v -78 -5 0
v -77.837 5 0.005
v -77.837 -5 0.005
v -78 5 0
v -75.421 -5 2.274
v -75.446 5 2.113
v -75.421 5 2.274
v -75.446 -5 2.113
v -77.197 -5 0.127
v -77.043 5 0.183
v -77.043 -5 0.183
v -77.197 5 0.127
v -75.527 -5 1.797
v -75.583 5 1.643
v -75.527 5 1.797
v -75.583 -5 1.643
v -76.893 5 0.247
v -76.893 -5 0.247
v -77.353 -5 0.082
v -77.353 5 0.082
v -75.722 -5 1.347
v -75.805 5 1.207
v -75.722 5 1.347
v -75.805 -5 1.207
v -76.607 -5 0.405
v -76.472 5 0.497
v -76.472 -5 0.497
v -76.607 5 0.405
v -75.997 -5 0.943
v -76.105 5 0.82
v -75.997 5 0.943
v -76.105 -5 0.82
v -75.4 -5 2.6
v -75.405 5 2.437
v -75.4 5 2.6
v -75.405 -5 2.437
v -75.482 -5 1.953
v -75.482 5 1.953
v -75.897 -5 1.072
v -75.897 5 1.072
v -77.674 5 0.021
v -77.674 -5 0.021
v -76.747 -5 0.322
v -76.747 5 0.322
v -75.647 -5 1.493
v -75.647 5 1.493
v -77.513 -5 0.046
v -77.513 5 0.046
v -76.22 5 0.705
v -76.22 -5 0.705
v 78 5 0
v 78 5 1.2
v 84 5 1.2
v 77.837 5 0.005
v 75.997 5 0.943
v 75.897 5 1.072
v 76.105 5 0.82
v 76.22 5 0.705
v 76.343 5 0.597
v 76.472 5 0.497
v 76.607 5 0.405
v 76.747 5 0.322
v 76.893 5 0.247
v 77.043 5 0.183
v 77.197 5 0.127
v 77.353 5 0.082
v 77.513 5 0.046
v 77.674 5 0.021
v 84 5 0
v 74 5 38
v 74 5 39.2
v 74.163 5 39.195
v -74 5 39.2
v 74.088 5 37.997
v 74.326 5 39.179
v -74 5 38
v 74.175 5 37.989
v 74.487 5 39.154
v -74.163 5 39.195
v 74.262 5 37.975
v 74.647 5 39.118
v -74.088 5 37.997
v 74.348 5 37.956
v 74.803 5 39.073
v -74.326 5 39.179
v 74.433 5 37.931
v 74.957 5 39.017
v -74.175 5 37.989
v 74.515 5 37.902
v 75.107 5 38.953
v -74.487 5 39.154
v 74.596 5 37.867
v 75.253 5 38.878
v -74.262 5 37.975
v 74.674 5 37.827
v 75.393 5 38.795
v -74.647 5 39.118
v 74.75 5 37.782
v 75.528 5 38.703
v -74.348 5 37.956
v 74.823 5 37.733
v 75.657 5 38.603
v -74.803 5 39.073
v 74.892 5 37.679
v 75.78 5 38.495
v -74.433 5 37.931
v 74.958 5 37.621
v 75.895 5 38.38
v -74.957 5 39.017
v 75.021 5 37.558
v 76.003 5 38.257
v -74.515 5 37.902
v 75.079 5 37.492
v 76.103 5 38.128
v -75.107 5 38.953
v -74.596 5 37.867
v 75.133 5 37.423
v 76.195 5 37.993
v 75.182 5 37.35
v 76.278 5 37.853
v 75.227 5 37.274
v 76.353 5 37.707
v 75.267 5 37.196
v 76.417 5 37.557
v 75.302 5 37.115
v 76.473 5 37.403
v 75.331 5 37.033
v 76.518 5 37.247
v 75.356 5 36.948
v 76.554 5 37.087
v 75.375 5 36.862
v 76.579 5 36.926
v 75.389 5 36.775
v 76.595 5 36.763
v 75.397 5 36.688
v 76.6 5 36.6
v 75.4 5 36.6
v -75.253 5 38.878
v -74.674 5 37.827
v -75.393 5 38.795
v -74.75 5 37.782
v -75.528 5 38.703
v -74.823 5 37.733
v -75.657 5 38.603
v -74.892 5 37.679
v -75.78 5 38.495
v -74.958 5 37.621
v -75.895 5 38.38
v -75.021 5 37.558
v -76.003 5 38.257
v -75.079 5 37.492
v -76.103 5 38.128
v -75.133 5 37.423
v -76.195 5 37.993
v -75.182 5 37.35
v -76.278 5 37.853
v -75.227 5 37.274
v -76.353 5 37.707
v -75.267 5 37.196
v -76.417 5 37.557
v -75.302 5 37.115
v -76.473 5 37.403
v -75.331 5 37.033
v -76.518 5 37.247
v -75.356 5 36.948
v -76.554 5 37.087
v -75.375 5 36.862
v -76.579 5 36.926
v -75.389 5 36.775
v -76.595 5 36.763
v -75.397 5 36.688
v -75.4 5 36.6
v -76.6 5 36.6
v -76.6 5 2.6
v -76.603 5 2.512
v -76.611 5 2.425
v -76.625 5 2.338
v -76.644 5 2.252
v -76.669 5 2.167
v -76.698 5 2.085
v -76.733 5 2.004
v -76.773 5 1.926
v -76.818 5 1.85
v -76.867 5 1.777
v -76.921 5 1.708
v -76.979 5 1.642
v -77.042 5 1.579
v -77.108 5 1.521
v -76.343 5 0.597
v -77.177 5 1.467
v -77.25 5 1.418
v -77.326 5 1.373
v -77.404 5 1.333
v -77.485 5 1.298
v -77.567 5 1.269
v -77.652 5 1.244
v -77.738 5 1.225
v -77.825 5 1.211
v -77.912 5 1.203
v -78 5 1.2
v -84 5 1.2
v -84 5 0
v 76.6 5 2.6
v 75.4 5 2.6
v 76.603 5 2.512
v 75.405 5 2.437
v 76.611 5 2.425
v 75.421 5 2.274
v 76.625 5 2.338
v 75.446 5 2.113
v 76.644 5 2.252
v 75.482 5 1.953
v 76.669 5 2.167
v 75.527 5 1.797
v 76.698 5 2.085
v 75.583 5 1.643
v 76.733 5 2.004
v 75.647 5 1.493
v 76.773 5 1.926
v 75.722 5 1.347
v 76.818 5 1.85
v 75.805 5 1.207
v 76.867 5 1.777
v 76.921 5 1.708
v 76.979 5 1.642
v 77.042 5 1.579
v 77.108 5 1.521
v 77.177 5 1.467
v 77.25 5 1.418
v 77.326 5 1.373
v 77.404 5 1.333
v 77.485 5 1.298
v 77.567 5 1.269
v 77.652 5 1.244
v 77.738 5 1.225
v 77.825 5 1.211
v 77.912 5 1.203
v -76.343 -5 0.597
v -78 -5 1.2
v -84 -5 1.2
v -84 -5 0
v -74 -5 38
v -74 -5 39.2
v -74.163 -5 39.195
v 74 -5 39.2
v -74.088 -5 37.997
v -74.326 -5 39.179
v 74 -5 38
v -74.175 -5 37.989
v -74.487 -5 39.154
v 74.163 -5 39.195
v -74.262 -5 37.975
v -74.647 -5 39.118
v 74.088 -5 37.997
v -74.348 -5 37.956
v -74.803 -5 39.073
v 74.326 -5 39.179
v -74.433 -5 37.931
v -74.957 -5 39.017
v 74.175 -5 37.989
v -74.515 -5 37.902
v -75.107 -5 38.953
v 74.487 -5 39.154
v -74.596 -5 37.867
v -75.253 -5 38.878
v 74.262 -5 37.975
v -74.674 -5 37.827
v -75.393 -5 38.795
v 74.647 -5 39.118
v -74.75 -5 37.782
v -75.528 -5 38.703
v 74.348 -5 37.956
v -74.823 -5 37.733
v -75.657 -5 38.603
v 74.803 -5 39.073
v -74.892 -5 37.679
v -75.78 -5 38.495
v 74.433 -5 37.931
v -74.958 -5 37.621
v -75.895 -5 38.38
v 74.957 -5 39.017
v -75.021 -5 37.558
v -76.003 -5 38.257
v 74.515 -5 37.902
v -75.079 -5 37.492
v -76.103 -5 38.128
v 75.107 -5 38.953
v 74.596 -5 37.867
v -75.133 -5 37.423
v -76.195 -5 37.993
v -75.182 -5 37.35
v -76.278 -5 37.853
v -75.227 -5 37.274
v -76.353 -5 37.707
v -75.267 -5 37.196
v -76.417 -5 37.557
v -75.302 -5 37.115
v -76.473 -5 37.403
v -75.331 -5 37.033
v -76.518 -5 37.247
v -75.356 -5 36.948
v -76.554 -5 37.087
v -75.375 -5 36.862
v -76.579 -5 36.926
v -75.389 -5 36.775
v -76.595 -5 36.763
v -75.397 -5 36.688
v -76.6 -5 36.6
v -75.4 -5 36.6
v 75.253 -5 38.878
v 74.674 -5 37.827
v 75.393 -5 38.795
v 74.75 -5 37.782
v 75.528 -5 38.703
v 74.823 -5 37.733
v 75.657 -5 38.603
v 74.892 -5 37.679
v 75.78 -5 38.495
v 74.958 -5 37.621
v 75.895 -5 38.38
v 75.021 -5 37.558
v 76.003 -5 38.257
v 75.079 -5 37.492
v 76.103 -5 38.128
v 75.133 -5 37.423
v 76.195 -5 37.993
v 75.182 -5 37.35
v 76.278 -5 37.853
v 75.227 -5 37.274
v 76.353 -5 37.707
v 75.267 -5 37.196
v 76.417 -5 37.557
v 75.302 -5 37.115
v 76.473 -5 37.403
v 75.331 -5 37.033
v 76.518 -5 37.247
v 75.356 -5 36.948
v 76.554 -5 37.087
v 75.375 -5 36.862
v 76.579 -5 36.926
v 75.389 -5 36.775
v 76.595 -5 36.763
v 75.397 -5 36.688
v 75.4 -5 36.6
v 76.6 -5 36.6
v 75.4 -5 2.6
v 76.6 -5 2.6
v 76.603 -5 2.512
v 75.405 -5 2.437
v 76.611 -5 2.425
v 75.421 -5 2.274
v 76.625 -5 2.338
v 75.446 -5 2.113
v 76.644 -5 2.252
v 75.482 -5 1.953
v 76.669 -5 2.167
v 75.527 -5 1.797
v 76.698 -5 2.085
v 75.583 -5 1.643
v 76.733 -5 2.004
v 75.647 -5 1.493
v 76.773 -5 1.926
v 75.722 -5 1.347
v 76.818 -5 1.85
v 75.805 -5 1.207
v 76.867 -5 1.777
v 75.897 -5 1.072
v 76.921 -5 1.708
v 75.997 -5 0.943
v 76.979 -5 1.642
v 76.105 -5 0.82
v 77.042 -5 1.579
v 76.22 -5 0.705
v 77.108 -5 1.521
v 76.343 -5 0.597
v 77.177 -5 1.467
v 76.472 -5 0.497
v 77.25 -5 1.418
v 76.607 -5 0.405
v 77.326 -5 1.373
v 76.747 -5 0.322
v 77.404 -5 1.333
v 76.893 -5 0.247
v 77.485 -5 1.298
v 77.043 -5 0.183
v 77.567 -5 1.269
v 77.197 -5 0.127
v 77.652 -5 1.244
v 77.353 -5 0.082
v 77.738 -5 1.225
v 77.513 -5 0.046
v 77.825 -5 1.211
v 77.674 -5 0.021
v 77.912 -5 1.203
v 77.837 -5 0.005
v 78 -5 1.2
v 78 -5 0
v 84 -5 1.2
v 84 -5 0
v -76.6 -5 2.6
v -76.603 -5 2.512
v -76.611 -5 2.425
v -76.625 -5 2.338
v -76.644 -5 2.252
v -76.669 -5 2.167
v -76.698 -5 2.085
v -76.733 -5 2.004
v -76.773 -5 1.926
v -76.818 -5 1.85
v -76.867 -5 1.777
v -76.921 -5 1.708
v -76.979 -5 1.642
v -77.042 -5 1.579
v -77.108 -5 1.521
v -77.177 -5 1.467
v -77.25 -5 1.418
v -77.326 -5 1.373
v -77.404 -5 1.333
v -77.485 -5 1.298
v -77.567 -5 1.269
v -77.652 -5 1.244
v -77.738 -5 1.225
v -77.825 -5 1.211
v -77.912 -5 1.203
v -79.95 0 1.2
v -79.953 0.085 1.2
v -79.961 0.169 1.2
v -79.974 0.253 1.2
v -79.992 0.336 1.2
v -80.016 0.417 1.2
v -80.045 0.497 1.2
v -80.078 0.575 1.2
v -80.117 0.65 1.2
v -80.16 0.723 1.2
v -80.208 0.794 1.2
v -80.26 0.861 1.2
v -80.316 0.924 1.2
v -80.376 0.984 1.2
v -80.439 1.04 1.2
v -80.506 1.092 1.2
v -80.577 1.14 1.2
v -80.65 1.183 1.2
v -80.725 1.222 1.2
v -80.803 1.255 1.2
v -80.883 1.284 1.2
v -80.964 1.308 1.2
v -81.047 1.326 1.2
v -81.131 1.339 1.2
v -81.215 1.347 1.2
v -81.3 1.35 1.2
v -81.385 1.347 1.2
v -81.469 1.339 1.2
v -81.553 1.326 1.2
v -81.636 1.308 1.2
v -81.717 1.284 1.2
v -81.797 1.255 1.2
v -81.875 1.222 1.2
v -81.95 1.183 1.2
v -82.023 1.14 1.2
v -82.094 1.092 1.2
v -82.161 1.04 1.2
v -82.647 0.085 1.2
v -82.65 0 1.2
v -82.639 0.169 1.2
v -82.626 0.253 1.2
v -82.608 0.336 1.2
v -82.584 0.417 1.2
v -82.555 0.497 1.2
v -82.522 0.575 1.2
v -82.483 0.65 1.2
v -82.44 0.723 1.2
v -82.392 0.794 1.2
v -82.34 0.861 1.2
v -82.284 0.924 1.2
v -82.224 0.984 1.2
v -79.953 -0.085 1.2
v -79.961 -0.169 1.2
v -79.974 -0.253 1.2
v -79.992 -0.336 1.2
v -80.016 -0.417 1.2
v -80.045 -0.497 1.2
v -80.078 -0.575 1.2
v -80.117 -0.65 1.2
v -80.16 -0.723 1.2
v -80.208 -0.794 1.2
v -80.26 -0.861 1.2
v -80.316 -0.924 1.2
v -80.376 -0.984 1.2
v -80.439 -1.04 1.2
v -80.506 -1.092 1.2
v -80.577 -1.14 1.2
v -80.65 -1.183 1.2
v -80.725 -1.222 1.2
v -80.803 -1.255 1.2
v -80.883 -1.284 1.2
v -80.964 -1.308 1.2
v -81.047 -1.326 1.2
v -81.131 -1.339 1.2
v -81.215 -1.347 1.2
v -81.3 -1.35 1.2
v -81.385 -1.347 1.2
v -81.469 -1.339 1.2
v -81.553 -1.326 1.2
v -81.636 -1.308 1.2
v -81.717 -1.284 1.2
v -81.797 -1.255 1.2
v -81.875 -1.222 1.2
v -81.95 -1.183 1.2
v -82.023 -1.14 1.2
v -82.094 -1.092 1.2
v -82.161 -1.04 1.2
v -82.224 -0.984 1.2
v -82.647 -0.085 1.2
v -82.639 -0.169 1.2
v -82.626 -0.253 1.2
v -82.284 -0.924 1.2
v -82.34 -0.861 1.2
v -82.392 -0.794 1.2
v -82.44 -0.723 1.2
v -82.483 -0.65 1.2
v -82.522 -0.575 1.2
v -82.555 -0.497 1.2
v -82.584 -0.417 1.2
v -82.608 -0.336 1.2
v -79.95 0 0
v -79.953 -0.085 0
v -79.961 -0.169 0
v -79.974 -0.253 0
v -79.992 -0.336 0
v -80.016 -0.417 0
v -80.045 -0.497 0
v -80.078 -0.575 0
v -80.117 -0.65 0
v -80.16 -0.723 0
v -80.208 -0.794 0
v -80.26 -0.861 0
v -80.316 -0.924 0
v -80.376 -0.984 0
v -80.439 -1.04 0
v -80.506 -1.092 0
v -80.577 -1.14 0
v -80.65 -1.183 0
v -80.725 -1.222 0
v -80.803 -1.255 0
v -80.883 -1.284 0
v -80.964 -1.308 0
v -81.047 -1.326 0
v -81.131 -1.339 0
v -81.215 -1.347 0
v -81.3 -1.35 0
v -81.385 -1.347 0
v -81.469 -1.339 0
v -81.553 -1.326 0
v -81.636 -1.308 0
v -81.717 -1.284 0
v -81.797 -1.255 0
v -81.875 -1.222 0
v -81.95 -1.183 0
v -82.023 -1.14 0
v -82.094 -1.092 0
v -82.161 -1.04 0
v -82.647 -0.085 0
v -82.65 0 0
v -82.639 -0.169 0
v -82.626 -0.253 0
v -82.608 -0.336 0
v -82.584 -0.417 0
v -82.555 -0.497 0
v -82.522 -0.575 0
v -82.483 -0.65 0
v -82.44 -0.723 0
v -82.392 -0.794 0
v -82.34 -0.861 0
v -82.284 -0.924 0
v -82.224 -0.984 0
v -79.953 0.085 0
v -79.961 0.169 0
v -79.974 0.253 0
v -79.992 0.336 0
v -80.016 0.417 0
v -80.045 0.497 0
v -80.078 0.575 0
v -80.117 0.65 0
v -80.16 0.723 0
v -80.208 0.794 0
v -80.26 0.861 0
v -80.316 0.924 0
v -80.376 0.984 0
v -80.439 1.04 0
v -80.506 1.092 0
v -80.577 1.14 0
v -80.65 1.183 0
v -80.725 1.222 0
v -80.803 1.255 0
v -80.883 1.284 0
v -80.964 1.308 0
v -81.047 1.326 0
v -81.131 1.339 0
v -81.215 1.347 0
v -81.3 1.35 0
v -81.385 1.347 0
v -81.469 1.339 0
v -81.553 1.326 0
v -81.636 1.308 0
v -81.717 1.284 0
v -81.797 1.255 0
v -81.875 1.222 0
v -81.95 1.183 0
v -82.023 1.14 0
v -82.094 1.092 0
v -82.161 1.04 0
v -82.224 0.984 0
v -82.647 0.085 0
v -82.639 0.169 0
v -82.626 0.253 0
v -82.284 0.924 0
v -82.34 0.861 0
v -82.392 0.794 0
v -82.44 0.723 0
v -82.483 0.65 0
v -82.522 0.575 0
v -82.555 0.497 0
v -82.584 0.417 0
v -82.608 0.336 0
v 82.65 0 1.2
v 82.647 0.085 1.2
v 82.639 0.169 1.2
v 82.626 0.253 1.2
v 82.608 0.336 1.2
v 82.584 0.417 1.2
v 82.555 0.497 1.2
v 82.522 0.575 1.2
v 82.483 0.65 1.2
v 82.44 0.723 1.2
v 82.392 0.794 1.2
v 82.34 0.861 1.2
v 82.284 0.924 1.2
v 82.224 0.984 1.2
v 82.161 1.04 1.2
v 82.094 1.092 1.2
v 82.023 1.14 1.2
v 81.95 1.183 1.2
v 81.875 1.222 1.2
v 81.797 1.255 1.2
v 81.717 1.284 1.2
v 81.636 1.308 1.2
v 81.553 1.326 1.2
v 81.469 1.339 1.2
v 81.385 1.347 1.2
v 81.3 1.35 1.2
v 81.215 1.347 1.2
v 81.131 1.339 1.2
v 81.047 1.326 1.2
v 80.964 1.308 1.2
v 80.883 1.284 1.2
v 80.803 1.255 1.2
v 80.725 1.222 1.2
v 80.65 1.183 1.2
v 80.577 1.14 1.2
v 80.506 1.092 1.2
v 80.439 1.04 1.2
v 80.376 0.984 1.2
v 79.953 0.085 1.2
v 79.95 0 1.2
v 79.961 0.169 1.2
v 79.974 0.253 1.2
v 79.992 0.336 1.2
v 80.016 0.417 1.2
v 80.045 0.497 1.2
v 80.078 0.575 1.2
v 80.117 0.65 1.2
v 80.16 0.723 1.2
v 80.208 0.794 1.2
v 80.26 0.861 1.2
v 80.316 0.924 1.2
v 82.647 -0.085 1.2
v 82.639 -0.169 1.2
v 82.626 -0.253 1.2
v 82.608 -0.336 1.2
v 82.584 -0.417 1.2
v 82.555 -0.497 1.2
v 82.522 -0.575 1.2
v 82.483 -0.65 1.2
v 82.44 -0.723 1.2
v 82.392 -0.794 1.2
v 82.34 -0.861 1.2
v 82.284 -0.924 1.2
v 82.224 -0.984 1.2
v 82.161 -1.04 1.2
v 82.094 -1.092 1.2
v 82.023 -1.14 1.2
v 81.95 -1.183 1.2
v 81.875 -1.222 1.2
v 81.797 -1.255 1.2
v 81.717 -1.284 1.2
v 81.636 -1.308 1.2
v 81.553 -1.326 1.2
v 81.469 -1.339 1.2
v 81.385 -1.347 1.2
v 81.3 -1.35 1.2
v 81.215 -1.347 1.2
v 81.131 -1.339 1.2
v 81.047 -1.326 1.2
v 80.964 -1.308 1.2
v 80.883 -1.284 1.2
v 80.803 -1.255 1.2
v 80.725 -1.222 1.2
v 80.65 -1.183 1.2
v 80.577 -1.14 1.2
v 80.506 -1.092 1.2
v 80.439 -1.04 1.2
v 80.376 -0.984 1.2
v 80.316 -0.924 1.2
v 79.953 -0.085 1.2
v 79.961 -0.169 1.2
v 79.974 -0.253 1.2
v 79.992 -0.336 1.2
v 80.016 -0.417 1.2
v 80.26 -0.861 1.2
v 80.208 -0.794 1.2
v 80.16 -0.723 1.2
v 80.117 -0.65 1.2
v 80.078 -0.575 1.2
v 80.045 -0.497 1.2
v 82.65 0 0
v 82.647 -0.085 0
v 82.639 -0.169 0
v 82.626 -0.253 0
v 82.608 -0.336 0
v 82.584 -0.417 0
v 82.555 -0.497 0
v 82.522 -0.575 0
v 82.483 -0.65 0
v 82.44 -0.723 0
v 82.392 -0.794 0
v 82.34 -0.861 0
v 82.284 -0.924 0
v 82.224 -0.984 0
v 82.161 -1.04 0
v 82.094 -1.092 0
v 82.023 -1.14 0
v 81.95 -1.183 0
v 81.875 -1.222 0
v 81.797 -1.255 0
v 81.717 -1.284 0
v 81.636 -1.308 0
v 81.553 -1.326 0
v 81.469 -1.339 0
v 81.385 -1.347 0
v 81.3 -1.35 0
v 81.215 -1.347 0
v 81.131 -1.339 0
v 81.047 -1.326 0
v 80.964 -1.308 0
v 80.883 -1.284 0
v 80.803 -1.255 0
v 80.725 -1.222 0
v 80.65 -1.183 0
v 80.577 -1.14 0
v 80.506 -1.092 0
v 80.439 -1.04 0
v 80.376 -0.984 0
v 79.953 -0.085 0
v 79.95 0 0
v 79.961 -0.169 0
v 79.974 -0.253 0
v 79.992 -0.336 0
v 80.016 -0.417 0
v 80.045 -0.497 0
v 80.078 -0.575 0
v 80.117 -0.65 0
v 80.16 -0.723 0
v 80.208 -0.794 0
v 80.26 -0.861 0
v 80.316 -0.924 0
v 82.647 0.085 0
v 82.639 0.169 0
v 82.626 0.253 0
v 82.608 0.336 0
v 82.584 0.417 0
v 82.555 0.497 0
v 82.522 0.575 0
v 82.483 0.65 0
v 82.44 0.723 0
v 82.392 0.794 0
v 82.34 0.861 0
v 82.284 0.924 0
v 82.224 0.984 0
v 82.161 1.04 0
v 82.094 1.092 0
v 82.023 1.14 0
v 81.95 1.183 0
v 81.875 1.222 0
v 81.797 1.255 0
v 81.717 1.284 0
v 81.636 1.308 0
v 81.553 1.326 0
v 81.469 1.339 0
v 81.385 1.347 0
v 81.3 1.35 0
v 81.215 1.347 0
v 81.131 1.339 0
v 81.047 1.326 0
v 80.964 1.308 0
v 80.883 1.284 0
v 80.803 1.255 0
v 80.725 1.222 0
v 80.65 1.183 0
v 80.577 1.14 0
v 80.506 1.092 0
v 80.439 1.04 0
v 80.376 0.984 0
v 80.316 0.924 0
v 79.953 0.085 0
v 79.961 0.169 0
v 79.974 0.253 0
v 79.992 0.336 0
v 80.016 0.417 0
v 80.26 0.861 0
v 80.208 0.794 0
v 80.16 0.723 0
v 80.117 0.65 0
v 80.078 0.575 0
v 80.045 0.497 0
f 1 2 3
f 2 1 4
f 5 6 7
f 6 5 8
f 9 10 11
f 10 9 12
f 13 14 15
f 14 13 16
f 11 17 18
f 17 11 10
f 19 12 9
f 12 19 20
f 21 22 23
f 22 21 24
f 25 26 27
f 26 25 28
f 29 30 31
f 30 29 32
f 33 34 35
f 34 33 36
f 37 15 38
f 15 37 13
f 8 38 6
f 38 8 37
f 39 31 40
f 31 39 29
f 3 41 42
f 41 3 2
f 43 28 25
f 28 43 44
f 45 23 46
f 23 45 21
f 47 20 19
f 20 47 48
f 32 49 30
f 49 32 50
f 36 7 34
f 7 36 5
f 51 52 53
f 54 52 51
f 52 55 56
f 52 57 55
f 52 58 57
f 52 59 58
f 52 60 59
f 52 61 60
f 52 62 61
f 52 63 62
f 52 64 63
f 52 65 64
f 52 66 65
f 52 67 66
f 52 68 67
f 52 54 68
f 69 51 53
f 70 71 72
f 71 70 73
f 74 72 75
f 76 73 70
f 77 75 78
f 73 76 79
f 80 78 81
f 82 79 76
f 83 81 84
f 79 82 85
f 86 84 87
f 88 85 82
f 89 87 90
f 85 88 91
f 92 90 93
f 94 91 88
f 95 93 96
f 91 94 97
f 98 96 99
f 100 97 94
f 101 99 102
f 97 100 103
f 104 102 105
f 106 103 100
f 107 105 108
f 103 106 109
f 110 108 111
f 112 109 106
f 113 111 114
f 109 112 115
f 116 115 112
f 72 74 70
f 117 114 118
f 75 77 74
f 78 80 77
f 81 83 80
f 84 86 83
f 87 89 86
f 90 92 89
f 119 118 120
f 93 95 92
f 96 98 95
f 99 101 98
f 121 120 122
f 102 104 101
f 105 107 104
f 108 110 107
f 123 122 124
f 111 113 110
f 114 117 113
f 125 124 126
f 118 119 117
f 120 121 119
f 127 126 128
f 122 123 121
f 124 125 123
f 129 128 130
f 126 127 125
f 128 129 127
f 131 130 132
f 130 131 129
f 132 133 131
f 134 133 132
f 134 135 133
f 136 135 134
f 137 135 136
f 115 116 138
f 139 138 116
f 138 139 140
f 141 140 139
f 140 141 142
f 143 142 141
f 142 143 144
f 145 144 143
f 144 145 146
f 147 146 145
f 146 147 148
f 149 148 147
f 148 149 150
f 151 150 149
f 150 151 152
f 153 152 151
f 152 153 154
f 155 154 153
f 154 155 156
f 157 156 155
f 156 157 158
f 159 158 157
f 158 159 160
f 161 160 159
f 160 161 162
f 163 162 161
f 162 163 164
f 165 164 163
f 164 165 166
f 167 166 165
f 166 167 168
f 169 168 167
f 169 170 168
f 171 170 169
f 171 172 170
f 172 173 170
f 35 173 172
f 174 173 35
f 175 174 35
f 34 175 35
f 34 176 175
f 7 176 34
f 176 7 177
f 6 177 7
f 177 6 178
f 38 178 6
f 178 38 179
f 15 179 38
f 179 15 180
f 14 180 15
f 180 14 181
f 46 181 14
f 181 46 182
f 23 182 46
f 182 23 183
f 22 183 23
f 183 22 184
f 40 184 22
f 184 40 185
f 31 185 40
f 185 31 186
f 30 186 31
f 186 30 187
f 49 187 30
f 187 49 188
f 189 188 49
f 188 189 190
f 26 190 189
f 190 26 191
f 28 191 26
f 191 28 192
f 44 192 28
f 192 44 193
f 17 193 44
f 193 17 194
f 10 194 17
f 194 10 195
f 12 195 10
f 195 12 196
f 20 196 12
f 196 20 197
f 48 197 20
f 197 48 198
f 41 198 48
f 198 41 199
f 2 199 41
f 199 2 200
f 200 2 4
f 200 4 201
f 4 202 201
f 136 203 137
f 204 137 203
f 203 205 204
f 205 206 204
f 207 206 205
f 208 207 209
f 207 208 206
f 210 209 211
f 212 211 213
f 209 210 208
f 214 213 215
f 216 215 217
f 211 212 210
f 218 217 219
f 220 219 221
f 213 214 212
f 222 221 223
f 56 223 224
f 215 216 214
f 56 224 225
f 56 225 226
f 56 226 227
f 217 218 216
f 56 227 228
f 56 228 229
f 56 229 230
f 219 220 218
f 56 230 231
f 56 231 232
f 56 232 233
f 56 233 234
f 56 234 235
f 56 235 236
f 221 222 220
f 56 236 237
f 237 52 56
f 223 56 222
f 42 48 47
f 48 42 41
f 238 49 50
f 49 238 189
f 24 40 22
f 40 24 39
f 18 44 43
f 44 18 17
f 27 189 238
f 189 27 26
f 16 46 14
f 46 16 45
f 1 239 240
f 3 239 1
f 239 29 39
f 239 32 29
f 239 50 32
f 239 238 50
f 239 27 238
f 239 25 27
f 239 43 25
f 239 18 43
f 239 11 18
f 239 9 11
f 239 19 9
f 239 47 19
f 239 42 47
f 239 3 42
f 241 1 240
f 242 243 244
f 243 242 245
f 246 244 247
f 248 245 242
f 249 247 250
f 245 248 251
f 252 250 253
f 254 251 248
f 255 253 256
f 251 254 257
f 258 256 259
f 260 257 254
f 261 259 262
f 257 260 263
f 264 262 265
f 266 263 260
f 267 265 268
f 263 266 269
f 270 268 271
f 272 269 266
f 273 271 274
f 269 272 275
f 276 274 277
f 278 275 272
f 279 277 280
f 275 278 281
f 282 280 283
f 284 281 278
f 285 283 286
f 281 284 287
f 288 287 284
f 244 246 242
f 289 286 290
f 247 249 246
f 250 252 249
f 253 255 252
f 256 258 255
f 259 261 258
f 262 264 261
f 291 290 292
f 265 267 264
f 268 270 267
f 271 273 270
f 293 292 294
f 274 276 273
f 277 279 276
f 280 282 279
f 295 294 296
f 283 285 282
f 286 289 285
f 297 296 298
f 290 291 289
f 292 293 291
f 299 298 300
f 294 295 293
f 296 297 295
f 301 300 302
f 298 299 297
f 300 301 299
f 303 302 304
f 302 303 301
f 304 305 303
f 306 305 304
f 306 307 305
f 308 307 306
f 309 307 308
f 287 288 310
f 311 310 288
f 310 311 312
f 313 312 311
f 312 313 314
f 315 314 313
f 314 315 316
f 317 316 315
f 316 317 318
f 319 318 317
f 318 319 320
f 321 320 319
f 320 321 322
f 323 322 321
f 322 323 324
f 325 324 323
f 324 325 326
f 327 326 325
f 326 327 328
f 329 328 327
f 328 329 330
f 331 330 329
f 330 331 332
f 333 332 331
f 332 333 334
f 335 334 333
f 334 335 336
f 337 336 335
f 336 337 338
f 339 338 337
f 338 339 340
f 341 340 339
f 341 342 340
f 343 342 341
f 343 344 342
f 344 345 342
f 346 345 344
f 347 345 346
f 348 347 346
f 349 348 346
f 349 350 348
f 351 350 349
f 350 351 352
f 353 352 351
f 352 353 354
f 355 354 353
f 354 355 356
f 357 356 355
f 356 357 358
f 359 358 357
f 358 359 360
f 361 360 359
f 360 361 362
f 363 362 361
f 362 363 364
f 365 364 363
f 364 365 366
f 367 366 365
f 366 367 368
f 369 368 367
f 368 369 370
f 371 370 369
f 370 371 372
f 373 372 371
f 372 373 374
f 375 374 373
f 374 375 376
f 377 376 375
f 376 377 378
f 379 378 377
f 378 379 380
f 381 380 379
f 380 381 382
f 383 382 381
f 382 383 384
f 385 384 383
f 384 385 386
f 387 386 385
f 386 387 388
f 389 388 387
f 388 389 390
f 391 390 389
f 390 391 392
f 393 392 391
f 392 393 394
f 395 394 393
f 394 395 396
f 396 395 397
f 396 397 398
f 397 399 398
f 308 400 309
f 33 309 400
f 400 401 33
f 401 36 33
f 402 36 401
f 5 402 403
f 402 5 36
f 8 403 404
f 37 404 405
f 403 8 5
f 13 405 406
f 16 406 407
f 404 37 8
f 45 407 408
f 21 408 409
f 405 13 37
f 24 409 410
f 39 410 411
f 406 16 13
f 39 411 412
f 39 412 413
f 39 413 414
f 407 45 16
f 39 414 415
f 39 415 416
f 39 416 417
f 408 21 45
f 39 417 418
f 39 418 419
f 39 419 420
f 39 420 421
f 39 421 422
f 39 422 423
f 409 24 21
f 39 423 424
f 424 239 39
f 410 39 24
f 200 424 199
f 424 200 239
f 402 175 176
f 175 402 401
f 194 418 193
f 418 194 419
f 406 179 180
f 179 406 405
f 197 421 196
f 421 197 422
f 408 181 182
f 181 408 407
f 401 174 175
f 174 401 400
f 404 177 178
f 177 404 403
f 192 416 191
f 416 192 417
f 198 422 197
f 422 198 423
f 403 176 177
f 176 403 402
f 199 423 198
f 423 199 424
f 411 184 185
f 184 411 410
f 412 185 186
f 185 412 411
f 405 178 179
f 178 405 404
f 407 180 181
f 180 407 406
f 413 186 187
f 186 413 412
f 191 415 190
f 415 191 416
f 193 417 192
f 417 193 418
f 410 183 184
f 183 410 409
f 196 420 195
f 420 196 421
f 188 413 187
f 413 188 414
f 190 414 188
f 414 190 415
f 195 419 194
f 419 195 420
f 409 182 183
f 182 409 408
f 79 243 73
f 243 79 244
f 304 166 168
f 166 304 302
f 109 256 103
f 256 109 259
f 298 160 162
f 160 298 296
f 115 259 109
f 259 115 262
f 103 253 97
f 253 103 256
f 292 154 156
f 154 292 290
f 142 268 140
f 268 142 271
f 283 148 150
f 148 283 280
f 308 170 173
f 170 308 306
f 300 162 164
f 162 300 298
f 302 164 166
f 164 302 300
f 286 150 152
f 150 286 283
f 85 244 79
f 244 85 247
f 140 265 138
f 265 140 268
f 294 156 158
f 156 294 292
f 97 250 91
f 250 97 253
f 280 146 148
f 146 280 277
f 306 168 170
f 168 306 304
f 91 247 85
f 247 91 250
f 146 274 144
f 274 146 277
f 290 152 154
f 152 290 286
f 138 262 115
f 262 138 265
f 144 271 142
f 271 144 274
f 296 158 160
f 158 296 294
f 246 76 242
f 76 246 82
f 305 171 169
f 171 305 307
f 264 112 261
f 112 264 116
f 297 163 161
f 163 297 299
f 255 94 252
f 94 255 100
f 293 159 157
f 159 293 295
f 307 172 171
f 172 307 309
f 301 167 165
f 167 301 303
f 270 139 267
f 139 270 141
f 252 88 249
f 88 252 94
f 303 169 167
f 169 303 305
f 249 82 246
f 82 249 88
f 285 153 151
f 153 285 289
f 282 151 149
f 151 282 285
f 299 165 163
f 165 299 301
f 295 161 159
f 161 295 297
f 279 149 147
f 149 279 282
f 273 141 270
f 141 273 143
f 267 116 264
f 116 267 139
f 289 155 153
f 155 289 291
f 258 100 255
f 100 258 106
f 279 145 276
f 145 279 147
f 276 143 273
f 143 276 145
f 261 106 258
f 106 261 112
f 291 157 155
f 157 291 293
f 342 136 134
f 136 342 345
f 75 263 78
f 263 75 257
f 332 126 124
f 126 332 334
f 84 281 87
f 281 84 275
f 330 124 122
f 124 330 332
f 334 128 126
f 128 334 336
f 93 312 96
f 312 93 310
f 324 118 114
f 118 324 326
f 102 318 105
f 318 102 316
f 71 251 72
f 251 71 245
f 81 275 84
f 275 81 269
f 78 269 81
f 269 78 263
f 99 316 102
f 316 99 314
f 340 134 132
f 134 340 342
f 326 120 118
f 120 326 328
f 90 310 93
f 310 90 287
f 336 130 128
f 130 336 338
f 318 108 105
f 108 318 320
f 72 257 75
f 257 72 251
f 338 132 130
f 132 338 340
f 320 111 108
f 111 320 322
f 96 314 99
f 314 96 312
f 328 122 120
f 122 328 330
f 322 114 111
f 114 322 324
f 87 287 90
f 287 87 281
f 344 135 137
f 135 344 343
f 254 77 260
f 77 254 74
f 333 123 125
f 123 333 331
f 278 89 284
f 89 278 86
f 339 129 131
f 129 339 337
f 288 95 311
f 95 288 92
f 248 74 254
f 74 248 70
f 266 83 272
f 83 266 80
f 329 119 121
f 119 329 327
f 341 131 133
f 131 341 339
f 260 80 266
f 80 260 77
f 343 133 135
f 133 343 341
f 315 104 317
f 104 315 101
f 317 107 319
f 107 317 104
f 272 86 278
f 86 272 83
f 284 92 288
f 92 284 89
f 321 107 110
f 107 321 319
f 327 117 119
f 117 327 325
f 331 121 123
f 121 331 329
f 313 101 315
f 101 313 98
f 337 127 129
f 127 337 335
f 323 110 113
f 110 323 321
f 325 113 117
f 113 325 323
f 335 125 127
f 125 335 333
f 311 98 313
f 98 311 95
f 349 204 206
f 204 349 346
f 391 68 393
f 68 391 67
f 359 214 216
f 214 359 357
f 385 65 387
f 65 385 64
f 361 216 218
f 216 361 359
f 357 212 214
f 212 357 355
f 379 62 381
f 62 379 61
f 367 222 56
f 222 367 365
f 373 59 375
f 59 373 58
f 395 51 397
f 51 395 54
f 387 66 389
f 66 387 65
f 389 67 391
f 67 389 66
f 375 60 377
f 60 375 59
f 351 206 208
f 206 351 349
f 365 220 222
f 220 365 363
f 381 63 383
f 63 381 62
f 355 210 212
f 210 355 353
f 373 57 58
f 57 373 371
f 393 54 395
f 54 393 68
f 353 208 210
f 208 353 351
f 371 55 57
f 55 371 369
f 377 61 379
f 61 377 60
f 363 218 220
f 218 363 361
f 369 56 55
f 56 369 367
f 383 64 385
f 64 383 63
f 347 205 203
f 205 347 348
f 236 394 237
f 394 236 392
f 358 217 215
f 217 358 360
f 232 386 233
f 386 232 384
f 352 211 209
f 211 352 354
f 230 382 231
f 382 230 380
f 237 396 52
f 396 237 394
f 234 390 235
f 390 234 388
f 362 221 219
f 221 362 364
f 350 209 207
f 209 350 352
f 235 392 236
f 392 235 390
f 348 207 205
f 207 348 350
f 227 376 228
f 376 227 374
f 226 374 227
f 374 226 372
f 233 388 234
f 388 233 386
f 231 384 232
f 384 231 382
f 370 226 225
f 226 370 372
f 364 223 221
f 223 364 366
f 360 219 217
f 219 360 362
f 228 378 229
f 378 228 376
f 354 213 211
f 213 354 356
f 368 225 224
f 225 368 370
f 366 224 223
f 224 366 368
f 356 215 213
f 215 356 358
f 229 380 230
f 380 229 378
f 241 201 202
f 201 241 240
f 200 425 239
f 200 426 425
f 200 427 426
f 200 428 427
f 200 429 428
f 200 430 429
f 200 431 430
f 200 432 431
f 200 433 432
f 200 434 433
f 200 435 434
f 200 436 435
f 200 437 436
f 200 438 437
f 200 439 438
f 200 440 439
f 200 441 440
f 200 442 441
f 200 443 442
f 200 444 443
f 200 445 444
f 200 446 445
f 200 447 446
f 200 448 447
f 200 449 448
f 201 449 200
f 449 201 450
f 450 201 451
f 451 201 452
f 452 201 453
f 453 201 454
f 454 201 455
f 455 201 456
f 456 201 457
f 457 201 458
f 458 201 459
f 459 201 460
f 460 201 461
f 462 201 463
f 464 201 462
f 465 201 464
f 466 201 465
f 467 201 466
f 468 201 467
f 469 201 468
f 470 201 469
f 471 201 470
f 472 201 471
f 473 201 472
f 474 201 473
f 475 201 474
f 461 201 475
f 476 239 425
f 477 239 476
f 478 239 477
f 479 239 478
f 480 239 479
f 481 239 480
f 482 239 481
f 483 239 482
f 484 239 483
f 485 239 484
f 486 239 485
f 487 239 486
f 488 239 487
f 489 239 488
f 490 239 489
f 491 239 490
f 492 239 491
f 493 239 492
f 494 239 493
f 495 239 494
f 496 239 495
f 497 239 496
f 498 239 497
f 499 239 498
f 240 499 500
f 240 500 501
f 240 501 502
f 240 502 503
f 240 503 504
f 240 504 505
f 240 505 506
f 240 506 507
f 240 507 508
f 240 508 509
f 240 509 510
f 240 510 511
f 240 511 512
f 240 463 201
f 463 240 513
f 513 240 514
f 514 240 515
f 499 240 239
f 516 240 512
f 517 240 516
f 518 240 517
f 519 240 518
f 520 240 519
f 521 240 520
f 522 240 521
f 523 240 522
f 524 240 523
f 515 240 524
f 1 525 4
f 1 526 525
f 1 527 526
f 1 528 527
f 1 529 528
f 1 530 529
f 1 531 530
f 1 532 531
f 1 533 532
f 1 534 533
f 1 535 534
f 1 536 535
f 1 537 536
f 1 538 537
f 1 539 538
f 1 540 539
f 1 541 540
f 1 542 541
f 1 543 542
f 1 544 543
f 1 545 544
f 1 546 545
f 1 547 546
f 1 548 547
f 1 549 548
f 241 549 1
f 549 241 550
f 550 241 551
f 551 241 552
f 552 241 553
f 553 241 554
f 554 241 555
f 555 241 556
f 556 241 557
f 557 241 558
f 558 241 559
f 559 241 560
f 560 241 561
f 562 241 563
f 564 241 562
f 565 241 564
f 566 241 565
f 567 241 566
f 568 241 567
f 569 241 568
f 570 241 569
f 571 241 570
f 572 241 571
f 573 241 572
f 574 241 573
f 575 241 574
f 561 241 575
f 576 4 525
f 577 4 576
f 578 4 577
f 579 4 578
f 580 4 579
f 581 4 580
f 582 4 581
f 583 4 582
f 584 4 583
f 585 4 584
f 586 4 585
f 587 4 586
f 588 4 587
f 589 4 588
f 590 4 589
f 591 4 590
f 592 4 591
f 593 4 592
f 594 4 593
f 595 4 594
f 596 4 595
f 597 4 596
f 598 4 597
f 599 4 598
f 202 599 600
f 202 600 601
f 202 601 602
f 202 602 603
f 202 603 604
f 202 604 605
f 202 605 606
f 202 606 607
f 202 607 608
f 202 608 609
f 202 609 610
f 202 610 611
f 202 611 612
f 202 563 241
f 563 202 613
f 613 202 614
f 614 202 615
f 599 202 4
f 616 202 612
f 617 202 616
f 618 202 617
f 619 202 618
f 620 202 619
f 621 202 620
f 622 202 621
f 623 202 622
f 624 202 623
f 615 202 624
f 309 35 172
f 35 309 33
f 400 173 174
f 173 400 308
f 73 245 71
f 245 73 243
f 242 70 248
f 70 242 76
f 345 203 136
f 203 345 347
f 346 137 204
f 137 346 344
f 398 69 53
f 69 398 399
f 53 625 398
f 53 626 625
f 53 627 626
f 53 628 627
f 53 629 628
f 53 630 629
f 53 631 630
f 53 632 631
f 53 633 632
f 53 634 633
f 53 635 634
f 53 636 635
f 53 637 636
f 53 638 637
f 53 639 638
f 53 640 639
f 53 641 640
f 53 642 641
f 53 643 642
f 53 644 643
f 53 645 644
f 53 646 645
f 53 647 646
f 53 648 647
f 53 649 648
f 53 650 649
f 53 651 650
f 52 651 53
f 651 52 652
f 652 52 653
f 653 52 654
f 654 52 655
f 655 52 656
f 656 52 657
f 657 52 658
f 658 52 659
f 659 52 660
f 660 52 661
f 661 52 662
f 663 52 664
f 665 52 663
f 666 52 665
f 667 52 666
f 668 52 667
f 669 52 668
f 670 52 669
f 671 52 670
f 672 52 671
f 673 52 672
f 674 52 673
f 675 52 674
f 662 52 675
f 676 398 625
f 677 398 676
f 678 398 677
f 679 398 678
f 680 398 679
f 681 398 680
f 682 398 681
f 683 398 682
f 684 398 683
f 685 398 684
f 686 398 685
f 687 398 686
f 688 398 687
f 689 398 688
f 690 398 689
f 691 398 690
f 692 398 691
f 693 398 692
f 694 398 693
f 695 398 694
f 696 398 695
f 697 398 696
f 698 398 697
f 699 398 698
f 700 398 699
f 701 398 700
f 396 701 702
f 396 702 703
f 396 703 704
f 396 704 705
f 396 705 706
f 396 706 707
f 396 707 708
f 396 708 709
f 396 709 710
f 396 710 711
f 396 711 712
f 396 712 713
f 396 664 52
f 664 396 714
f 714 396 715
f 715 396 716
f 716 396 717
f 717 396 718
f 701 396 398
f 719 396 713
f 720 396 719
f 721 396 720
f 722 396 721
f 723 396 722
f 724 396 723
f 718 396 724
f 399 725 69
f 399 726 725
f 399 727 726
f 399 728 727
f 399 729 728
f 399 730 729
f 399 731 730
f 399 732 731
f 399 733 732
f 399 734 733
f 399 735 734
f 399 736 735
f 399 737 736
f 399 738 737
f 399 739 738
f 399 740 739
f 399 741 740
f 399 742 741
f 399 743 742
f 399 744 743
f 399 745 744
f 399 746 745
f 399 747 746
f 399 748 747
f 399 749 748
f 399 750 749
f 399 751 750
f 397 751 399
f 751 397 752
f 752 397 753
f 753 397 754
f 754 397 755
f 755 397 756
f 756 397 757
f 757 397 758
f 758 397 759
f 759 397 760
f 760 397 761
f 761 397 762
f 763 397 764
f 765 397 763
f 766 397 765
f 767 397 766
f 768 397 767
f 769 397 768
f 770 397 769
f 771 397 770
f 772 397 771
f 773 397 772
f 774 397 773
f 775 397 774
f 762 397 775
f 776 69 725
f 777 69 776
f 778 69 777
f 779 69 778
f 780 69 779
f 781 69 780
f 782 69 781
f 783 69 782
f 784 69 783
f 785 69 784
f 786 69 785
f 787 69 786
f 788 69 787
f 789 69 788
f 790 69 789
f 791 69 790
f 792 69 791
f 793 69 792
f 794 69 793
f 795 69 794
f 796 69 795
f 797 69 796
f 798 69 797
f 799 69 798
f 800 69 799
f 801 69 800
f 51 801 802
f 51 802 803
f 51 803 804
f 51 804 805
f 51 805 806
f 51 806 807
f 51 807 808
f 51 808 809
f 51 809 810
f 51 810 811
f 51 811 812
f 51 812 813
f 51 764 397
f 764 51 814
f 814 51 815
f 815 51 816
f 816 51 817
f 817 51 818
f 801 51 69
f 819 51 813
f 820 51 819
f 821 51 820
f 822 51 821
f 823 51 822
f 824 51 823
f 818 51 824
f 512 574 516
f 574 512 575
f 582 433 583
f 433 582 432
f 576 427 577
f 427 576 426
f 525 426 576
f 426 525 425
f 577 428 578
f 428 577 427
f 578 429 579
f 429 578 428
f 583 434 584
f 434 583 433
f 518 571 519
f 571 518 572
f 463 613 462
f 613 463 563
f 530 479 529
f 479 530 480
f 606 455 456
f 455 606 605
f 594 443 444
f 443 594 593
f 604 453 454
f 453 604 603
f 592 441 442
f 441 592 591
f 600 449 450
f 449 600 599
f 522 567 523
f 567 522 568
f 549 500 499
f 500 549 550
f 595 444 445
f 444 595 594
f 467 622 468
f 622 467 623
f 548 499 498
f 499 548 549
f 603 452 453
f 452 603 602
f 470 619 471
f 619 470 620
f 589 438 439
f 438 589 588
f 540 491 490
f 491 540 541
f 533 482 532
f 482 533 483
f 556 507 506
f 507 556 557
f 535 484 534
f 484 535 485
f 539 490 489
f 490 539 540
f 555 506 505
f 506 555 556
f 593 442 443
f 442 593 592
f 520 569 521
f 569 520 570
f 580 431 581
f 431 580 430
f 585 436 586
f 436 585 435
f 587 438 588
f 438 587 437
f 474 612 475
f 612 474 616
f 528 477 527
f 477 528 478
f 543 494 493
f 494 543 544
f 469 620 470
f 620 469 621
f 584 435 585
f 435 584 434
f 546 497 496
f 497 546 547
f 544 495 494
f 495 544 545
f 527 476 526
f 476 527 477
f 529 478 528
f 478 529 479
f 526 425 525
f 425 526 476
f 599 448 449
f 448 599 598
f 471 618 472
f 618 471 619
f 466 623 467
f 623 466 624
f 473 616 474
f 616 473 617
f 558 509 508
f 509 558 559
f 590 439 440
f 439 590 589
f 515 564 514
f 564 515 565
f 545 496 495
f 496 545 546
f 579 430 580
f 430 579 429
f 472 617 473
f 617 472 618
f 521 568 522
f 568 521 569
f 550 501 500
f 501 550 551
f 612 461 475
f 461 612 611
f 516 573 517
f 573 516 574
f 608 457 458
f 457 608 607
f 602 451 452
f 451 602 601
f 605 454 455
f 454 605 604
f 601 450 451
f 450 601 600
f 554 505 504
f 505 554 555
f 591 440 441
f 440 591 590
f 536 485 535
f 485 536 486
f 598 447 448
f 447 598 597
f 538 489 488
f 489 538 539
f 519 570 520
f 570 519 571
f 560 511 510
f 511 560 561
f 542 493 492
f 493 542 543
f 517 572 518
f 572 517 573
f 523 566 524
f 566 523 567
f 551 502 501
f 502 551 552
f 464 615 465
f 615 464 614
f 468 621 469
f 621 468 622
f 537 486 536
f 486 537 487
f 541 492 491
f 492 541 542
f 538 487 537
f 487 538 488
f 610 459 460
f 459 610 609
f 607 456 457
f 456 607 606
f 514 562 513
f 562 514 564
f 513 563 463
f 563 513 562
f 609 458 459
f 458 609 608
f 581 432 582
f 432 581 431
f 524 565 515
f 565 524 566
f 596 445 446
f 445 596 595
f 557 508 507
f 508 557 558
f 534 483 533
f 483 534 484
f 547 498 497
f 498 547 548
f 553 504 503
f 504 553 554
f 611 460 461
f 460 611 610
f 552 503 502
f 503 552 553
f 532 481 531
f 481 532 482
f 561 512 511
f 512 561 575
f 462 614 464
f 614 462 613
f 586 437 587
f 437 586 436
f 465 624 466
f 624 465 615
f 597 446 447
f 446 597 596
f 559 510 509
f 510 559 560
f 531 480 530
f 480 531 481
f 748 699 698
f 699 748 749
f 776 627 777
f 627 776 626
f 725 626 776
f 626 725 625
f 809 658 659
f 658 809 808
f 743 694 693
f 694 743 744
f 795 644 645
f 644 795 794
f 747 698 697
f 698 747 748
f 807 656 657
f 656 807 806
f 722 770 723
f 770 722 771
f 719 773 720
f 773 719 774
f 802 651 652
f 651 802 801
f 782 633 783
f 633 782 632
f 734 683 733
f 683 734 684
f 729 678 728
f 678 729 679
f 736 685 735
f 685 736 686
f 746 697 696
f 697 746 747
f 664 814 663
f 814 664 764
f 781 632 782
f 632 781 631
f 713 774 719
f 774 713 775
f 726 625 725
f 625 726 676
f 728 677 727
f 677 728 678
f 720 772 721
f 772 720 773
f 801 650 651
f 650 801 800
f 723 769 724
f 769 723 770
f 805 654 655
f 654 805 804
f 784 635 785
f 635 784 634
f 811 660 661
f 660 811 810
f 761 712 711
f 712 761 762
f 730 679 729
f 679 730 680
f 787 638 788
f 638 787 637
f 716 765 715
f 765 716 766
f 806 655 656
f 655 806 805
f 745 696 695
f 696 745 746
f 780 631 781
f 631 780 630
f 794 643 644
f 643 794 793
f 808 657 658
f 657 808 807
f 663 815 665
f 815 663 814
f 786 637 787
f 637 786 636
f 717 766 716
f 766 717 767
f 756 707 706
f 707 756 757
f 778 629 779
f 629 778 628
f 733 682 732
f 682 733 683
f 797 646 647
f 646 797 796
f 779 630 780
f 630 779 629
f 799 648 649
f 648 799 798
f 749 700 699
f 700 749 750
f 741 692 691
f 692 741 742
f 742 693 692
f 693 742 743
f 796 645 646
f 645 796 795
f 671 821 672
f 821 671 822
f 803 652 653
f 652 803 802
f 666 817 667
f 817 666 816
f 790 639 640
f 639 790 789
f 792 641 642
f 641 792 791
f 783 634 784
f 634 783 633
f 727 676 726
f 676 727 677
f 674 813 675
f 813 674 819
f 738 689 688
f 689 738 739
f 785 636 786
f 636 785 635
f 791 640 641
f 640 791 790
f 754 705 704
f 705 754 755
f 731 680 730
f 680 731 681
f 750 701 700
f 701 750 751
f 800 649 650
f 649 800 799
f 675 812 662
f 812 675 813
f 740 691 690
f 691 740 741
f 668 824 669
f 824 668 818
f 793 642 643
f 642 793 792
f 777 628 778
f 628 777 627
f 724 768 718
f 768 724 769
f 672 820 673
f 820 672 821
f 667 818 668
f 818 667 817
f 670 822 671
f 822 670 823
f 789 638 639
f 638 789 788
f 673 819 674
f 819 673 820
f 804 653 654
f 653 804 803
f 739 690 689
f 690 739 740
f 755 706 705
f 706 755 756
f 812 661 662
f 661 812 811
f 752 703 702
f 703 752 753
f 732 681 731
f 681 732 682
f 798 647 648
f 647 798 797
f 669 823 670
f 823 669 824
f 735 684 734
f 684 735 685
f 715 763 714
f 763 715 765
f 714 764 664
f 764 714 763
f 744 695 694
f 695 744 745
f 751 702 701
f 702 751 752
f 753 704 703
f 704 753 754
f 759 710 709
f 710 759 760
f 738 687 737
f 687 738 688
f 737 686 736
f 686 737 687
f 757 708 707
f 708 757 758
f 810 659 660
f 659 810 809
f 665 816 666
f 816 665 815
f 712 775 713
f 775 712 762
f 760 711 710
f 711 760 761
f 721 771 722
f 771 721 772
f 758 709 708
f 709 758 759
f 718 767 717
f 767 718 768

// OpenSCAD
$fn=100;
// This scad designs the bracket for fixing R1000 modules on a R1000A and R1000A-mini boards

// global variables

tsheet = 1.2;       // sheet metal thickness
tbracket = 10;      // bracket thickness

wbracket = 152;     // bracket width (R1000A)
//wbracket = 102;     // bracket width (R1000A-10)


hbracket = 38;      // bracket height
rbend = 2;          // sheet metal bend radius
dscrew = 2.7;       // mounting screws diameter

lscrewl = 2.7;      // distance between left base edge and screw hole center
lscrewr = 2.7;      // distance between right base edge and screw hole center

lbasel = 8;         // left base length
lbaser = 8;         // right base length



difference() {
    // main body
    translate ([-wbracket/2,0,tsheet/2]) rotate ([90,0,0]) translate ([0,0,-tbracket/2]) main_body();
    // mounting screw holes
    translate ([-wbracket/2-lbasel+lscrewl,0,0]) cylinder (d=dscrew, h=1000, center=true);
    translate ([wbracket/2+lbaser-lscrewr,0,0]) cylinder (d=dscrew, h=1000, center=true);
}

module main_body() {
    // left base plate
    translate ([-1*lbasel,tsheet/-2,0]) cube([lbasel-rbend,tsheet,tbracket]);
    // left bottom bend elbow
    translate ([-1*rbend,rbend,0]) rotate ([0,0,-90]) difference() {
        pie_slice_3D(rbend+tsheet/2,0,90,tbracket);
        pie_slice_3D(rbend-tsheet/2,0,90,tbracket);
    }
    //left side plate
    translate ([tsheet/-2,rbend,0]) cube([tsheet,hbracket-2*rbend,tbracket]);
    // left top bend elbow
    translate ([rbend,hbracket-rbend,0]) rotate ([0,0,90]) difference() {
        pie_slice_3D(rbend+tsheet/2,0,90,tbracket);
        pie_slice_3D(rbend-tsheet/2,0,90,tbracket);
    }
    // top plate
    translate ([rbend,hbracket-tsheet/2,0]) cube([wbracket-2*rbend,tsheet,tbracket]);
    // right top bend elbow
    translate ([wbracket-rbend,hbracket-rbend,0]) rotate ([0,0,0]) difference() {
        pie_slice_3D(rbend+tsheet/2,0,90,tbracket);
        pie_slice_3D(rbend-tsheet/2,0,90,tbracket);
    }
    // right side plate
    translate ([wbracket-tsheet/2,rbend,0]) cube([tsheet,hbracket-2*rbend,tbracket]);
    // right bottom bend elbow
    translate ([wbracket+rbend,rbend,0]) rotate ([0,0,180]) difference() {
        pie_slice_3D(rbend+tsheet/2,0,90,tbracket);
        pie_slice_3D(rbend-tsheet/2,0,90,tbracket);
    }
    // right base plate
    translate ([wbracket+rbend,tsheet/-2,0]) cube([lbaser-rbend,tsheet,tbracket]);
}

module pie_slice_2D(r, start_angle, end_angle) {
    // this draws a 2D slice
    // taken from http://forum.openscad.org/Creating-pie-pizza-slice-shape-need-a-dynamic-length-array-td3148.html
    R = r * sqrt(2) + 1;
    a0 = (4 * start_angle + 0 * end_angle) / 4;
    a1 = (3 * start_angle + 1 * end_angle) / 4;
    a2 = (2 * start_angle + 2 * end_angle) / 4;
    a3 = (1 * start_angle + 3 * end_angle) / 4;
    a4 = (0 * start_angle + 4 * end_angle) / 4;
    if(end_angle > start_angle)
        intersection() {
        circle(r);
        polygon([
            [0,0],
            [R * cos(a0), R * sin(a0)],
            [R * cos(a1), R * sin(a1)],
            [R * cos(a2), R * sin(a2)],
            [R * cos(a3), R * sin(a3)],
            [R * cos(a4), R * sin(a4)],
            [0,0]
       ]);
    }
}
module pie_slice_3D(r, start_angle, end_angle, h) {
    // this extrudes a 2D slice linearly
    linear_extrude(height=h) pie_slice_2D(r, start_angle, end_angle);
}
